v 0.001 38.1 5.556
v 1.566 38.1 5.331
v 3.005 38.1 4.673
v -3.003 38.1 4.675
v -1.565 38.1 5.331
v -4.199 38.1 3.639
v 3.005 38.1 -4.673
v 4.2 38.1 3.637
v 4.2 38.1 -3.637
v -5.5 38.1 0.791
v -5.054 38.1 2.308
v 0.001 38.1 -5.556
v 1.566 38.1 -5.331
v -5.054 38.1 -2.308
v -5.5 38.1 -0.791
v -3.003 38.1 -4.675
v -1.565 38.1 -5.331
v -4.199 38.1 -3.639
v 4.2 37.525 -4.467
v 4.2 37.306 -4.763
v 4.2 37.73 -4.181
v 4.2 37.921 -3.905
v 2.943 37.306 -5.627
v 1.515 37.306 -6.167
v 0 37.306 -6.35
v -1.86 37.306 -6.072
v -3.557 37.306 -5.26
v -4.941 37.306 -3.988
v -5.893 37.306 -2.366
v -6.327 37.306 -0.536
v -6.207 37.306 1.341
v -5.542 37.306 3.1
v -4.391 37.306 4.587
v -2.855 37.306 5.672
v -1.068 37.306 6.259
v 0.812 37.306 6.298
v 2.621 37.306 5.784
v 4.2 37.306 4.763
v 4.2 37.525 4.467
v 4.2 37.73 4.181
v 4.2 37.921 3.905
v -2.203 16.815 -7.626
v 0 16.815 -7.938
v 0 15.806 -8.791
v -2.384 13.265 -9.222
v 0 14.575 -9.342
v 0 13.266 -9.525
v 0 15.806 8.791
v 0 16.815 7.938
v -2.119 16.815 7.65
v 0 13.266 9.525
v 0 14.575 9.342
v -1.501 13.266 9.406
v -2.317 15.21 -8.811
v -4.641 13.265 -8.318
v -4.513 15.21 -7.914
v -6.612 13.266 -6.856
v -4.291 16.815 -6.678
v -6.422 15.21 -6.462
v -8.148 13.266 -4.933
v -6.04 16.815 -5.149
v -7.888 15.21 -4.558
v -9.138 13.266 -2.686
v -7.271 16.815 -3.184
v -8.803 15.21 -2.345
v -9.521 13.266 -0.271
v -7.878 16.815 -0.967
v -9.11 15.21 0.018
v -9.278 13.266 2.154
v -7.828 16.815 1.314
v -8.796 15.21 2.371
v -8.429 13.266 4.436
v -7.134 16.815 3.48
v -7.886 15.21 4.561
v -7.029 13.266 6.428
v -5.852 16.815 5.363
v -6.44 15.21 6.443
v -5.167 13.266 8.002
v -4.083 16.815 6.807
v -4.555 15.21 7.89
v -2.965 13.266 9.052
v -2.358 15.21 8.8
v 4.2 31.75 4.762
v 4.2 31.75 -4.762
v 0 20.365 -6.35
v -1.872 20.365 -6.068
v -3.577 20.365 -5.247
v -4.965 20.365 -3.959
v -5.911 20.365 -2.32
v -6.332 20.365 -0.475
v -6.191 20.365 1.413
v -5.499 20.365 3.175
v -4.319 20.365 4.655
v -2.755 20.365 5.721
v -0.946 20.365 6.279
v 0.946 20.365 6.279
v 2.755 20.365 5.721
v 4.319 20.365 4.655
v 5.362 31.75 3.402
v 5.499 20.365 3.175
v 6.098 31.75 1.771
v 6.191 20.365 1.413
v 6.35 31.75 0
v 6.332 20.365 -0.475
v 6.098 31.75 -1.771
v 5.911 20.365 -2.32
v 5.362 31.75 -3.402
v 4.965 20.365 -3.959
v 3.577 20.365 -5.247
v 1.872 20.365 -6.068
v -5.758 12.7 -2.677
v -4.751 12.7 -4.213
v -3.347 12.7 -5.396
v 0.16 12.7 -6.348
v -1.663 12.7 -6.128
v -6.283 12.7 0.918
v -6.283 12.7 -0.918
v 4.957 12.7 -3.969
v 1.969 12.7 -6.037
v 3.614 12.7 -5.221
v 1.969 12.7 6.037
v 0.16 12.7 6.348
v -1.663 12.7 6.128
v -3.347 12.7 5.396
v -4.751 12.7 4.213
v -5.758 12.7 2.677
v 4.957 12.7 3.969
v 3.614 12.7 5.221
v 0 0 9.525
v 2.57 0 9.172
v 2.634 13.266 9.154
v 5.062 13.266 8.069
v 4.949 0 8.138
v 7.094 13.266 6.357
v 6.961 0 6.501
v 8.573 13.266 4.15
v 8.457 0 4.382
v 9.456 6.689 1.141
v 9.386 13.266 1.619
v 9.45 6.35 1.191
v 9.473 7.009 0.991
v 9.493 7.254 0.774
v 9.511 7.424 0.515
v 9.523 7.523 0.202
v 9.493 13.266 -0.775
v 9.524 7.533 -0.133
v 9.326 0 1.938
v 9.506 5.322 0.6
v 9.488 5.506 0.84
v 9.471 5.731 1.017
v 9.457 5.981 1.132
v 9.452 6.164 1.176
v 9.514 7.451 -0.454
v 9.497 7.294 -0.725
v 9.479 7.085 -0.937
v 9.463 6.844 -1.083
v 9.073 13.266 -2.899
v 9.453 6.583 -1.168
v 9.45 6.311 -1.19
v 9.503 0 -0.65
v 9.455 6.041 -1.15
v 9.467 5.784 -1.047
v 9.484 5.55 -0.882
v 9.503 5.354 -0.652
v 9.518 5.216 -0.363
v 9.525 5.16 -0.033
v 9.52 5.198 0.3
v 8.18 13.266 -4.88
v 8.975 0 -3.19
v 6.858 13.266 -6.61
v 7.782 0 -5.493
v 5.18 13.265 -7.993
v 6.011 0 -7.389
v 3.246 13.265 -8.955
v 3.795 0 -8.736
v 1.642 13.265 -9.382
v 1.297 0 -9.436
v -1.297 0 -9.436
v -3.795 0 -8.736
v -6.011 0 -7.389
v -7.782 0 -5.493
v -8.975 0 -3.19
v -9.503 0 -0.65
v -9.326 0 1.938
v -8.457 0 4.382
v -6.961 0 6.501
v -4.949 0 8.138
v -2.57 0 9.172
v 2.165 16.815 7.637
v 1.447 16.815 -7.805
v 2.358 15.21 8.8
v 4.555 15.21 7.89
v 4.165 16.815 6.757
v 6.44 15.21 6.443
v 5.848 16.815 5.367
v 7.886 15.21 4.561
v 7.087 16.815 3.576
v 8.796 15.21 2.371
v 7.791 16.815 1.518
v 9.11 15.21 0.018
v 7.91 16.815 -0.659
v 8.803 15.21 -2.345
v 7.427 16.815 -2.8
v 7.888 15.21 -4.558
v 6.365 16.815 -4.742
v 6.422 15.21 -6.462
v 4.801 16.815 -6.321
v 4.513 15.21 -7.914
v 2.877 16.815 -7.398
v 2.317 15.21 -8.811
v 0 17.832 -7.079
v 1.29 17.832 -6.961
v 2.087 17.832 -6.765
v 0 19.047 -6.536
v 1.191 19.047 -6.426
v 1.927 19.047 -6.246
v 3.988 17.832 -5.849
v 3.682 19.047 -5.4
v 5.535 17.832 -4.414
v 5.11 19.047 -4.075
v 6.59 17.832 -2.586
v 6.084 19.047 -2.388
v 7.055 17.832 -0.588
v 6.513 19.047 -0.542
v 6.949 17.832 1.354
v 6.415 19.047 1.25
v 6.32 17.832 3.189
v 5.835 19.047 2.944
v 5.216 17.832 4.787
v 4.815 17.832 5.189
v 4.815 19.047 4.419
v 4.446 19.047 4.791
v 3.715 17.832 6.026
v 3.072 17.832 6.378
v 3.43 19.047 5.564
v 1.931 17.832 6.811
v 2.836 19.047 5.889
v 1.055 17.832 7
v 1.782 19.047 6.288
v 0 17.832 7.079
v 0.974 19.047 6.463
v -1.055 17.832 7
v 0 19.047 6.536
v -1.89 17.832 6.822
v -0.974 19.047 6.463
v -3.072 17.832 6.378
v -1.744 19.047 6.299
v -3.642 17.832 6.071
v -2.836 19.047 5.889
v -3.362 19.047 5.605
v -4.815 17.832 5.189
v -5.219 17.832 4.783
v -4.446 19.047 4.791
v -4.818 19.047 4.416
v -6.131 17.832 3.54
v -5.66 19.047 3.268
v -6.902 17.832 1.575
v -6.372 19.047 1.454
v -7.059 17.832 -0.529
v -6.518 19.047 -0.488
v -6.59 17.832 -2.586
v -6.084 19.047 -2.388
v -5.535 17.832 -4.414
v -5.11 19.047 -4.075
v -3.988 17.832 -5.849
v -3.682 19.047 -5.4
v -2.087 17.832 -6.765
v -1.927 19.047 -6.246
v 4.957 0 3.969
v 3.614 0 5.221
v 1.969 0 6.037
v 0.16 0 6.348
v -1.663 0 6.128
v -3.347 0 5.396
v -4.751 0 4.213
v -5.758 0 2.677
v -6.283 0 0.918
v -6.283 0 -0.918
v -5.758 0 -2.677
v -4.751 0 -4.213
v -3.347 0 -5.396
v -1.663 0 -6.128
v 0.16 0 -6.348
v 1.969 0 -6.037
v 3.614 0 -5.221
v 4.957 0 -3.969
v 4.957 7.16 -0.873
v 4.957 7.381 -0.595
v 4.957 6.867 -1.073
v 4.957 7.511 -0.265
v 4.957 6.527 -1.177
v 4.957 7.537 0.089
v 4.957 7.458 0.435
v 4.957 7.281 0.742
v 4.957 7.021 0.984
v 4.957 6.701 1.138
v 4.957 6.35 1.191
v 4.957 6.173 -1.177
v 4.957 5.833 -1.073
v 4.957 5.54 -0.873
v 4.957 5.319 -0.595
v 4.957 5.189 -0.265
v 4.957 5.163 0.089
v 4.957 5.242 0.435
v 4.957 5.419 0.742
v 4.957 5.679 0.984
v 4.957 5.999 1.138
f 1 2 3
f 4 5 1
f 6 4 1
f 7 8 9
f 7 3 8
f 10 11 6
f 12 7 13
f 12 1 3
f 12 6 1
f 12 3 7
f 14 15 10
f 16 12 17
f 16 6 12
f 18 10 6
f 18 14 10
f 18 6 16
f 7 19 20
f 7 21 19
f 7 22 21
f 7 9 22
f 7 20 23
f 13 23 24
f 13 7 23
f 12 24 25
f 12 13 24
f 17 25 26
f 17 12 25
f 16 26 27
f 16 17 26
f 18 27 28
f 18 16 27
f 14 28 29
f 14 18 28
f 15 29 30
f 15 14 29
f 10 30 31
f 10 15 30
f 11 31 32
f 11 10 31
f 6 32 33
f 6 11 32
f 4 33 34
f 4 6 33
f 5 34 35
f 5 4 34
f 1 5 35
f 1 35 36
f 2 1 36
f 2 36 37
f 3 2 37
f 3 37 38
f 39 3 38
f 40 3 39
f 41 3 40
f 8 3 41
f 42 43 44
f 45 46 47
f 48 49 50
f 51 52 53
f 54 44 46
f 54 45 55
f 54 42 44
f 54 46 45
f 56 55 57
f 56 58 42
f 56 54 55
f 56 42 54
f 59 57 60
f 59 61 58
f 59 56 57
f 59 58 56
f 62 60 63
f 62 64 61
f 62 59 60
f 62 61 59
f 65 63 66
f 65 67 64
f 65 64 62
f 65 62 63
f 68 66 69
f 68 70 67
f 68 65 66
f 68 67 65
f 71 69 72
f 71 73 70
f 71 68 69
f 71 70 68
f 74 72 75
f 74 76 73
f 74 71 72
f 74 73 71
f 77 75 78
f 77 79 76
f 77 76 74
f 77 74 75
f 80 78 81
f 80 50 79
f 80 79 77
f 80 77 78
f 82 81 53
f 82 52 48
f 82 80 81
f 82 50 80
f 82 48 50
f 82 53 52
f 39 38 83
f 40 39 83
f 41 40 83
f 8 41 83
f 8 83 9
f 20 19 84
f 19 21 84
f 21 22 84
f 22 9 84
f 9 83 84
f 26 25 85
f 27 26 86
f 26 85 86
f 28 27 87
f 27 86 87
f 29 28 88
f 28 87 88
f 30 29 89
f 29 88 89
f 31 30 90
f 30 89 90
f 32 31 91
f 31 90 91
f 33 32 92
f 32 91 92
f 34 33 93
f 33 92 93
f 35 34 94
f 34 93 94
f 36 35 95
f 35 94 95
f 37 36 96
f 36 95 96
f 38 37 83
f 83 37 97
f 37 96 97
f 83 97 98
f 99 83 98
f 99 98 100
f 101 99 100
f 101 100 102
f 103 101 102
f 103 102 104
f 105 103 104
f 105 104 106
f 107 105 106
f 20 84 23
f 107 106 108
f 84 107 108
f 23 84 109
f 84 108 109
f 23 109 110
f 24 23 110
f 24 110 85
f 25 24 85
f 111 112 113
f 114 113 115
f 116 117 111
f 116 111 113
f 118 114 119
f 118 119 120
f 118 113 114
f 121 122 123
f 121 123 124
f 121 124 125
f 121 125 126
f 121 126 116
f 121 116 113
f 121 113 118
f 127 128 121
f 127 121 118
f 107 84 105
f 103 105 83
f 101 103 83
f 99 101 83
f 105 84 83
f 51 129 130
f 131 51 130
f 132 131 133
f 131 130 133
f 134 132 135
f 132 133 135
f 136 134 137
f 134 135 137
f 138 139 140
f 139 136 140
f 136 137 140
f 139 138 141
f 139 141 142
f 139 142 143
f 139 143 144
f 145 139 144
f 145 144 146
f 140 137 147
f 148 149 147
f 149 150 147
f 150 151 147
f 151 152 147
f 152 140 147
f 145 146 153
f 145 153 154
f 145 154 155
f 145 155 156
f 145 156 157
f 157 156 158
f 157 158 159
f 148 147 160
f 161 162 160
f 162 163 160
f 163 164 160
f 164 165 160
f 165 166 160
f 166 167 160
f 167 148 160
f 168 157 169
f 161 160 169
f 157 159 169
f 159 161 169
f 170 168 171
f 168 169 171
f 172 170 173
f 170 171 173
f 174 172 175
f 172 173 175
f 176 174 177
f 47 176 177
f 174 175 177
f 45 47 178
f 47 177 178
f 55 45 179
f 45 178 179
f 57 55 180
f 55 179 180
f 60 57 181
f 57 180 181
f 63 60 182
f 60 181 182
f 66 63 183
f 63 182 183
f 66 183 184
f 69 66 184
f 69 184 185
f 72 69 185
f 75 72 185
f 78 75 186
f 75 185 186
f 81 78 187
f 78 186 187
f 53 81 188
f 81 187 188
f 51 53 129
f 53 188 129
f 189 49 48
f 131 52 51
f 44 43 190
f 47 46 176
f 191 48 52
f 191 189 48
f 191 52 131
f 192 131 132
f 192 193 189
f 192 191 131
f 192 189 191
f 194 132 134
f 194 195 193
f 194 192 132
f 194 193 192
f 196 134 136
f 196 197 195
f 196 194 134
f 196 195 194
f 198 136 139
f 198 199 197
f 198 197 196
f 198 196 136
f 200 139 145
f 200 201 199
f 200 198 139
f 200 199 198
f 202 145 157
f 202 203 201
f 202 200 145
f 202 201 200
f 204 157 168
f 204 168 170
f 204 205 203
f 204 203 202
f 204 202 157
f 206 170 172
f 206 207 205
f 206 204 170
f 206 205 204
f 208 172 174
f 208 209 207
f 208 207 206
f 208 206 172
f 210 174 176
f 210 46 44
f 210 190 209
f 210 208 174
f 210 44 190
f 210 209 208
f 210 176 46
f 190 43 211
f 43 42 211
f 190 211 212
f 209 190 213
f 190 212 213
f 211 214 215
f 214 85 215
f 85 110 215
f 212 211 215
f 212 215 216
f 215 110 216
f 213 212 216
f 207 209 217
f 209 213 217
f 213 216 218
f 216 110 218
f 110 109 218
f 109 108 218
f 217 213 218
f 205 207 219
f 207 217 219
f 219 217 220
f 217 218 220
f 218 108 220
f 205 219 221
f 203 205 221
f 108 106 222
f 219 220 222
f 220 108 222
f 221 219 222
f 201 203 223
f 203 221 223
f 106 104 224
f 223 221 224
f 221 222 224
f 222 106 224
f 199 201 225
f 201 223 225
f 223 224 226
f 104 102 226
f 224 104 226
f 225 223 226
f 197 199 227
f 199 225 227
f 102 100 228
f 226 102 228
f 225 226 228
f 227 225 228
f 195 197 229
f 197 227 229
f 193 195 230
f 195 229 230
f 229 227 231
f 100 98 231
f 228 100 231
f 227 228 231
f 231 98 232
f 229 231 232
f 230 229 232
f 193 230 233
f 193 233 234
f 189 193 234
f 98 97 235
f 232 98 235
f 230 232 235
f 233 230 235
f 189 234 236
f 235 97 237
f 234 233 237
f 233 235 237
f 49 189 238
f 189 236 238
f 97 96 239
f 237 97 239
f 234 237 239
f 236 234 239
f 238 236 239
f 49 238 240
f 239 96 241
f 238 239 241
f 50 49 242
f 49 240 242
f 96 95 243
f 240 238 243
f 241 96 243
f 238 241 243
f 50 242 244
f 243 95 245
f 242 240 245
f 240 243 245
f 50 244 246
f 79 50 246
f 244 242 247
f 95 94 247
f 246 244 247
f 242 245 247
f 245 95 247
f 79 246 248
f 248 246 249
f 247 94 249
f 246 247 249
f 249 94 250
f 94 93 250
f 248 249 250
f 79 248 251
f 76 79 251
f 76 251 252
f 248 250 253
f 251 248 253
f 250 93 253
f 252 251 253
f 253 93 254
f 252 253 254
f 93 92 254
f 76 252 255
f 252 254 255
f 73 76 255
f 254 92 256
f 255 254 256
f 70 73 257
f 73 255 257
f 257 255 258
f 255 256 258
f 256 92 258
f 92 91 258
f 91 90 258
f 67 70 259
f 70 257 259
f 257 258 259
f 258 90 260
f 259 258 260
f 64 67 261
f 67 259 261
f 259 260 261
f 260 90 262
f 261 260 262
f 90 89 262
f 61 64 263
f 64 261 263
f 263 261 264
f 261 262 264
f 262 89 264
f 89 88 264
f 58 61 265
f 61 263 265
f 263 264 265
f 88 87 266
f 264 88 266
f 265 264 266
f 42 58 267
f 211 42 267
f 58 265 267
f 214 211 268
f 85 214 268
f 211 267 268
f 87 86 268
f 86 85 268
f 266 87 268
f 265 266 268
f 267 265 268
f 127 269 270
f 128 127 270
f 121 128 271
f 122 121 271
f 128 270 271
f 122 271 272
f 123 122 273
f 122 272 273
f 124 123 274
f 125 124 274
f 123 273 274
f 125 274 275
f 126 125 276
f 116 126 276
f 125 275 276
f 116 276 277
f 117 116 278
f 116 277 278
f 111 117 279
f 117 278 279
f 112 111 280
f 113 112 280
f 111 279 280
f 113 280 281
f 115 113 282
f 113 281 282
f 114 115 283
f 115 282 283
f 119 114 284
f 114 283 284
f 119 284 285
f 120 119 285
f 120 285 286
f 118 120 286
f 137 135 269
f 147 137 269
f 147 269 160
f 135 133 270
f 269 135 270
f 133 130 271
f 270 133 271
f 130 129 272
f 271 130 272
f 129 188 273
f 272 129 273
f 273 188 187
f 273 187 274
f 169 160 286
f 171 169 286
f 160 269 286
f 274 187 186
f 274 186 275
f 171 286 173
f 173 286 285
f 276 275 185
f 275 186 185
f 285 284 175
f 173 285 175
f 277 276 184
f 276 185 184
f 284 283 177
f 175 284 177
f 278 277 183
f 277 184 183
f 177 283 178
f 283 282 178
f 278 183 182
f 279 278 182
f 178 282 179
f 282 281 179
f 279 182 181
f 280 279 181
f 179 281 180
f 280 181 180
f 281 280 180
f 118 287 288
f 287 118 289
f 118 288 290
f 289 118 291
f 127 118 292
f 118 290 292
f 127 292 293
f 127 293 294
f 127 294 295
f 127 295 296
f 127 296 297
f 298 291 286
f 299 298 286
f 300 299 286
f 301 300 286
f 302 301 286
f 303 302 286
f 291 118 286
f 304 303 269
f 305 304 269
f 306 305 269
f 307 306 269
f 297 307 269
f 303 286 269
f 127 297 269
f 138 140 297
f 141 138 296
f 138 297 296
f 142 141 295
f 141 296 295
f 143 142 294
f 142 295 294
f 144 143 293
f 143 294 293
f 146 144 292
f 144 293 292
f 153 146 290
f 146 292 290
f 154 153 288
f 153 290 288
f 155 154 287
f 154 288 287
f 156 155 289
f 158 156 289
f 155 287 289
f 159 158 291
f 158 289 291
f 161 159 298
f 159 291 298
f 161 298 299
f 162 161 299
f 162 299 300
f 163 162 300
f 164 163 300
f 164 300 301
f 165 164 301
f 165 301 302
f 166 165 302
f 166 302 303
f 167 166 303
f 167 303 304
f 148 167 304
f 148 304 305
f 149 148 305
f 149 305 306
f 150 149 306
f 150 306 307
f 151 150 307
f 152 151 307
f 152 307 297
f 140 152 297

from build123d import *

# Parameters (mm, degrees)
SKETCH1_R           = 9.525
MALE_END_DEPTH      = 15.875
SKETCH2_R           = 6.35
FEMALE_END_DEPTH    = 38.1
UPPER_R             = 4.7625
LOWER_R             = 4.7625
D_CUT_DEPTH         = 12.7
SET_HOLE_REACH      = 43.858
SET_HOLE_END_RADIUS = 9.525
SKETCH5_R           = 1.190625
D_START             = -6.35
D_BOSS_DEPTH        = 6.35
EDGE_CHAMFER_SIZE   = 0.79375


with BuildPart() as part:
    # Sketch1 → male end (new body)
    with BuildSketch(Plane(origin=(0, 0, 0), x_dir=(1, 0, 0), z_dir=(0, 1, 0))):
        with Locations(Location((0, 0, 0), (0, 0, 270))):
            Circle(SKETCH1_R)
    extrude(amount=MALE_END_DEPTH)

    # Sketch2 → female end (add)
    with BuildSketch(Plane(origin=(0, 0, 0), x_dir=(-1, 0, 0), z_dir=(0, 1, 0))):
        with Locations(Location((0, 0, 0), (0, 0, 270))):
            Circle(SKETCH2_R)
    extrude(amount=FEMALE_END_DEPTH)

    # upper
    # the kernel refuses this fillet: 4.7625 mm, written as the material it adds along each edge
    with BuildSketch(Plane(origin=(0, 15.875, 0), x_dir=(0, 0, -1), z_dir=(-1, 0, 0))) as upper_piece_1:
        with BuildLine():
            CenterArc((11.1125, -4.490128061), UPPER_R, 109.471220634, 70.528779366)
            Line((6.35, -4.490128061), (6.25475, -4.490128061))
            Line((6.25475, -4.490128061), (6.25475, 0))
            Line((6.25475, 0), (6.35, 0.09525))
            ThreePointArc((6.35, 0.09525), (7.9375, 0.09525), (9.49325, 0.089802561))
            Line((9.49325, 0.089802561), (9.525, 0))
        make_face()
    revolve(axis=Axis((0, 15.875, 0), (0, -1, 0)))

    # lower
    lower_edges = [part.edges().sort_by_distance(p)[0] for p in [
        (9.525, 15.875, 0),
    ]]
    fillet(lower_edges, radius=LOWER_R)

    # Sketch3 → D cut (cut)
    with BuildSketch(Plane.XZ):
        with BuildLine():
            Line((4.956967161, -3.96875), (4.956967161, 3.96875))
            ThreePointArc((4.956967161, 3.96875), (-6.35, 0), (4.956967161, -3.96875))
        make_face()
    extrude(amount=-D_CUT_DEPTH, mode=Mode.SUBTRACT)

    # set hole: up to this cylinder (the profile starts inside it)
    set_hole_end = Plane(origin=(0, 6.35, 0), z_dir=(0, -1, 0)) * Cylinder(SET_HOLE_END_RADIUS, 107.766, mode=Mode.PRIVATE)
    # Sketch5 → set hole (cut, up to the surface)
    with BuildSketch(Plane.ZY.offset(-4.956967161), mode=Mode.PRIVATE) as set_hole_sk1:
        with Locations((0, 6.35)):
            Circle(SKETCH5_R)
    set_hole_tool1 = extrude(set_hole_sk1.sketch, amount=-SET_HOLE_REACH, mode=Mode.PRIVATE) & set_hole_end
    add(set_hole_tool1.solids().sort_by_distance((4.956967, 6.35, 0))[0], mode=Mode.SUBTRACT)

    # Sketch4 → D boss (cut)
    with BuildSketch(Plane(origin=(0, 38.1, 0), x_dir=(-1, 0, 0), z_dir=(0, 1, 0)).offset(D_START)):
        with BuildLine():
            Line((-4.200130206, 4.7625), (-4.200130206, -4.7625))
            ThreePointArc((-4.200130206, -4.7625), (-6.35, 0), (-4.200130206, 4.7625))
        make_face()
    extrude(amount=D_BOSS_DEPTH, mode=Mode.SUBTRACT)

    # edge chamfer
    edge_chamfer_edges = [part.edges().sort_by_distance(p)[0] for p in [
        (-5.939881102, 38.1, 2.24506403),
    ]]
    chamfer(edge_chamfer_edges, length=EDGE_CHAMFER_SIZE)


solid = part.part
